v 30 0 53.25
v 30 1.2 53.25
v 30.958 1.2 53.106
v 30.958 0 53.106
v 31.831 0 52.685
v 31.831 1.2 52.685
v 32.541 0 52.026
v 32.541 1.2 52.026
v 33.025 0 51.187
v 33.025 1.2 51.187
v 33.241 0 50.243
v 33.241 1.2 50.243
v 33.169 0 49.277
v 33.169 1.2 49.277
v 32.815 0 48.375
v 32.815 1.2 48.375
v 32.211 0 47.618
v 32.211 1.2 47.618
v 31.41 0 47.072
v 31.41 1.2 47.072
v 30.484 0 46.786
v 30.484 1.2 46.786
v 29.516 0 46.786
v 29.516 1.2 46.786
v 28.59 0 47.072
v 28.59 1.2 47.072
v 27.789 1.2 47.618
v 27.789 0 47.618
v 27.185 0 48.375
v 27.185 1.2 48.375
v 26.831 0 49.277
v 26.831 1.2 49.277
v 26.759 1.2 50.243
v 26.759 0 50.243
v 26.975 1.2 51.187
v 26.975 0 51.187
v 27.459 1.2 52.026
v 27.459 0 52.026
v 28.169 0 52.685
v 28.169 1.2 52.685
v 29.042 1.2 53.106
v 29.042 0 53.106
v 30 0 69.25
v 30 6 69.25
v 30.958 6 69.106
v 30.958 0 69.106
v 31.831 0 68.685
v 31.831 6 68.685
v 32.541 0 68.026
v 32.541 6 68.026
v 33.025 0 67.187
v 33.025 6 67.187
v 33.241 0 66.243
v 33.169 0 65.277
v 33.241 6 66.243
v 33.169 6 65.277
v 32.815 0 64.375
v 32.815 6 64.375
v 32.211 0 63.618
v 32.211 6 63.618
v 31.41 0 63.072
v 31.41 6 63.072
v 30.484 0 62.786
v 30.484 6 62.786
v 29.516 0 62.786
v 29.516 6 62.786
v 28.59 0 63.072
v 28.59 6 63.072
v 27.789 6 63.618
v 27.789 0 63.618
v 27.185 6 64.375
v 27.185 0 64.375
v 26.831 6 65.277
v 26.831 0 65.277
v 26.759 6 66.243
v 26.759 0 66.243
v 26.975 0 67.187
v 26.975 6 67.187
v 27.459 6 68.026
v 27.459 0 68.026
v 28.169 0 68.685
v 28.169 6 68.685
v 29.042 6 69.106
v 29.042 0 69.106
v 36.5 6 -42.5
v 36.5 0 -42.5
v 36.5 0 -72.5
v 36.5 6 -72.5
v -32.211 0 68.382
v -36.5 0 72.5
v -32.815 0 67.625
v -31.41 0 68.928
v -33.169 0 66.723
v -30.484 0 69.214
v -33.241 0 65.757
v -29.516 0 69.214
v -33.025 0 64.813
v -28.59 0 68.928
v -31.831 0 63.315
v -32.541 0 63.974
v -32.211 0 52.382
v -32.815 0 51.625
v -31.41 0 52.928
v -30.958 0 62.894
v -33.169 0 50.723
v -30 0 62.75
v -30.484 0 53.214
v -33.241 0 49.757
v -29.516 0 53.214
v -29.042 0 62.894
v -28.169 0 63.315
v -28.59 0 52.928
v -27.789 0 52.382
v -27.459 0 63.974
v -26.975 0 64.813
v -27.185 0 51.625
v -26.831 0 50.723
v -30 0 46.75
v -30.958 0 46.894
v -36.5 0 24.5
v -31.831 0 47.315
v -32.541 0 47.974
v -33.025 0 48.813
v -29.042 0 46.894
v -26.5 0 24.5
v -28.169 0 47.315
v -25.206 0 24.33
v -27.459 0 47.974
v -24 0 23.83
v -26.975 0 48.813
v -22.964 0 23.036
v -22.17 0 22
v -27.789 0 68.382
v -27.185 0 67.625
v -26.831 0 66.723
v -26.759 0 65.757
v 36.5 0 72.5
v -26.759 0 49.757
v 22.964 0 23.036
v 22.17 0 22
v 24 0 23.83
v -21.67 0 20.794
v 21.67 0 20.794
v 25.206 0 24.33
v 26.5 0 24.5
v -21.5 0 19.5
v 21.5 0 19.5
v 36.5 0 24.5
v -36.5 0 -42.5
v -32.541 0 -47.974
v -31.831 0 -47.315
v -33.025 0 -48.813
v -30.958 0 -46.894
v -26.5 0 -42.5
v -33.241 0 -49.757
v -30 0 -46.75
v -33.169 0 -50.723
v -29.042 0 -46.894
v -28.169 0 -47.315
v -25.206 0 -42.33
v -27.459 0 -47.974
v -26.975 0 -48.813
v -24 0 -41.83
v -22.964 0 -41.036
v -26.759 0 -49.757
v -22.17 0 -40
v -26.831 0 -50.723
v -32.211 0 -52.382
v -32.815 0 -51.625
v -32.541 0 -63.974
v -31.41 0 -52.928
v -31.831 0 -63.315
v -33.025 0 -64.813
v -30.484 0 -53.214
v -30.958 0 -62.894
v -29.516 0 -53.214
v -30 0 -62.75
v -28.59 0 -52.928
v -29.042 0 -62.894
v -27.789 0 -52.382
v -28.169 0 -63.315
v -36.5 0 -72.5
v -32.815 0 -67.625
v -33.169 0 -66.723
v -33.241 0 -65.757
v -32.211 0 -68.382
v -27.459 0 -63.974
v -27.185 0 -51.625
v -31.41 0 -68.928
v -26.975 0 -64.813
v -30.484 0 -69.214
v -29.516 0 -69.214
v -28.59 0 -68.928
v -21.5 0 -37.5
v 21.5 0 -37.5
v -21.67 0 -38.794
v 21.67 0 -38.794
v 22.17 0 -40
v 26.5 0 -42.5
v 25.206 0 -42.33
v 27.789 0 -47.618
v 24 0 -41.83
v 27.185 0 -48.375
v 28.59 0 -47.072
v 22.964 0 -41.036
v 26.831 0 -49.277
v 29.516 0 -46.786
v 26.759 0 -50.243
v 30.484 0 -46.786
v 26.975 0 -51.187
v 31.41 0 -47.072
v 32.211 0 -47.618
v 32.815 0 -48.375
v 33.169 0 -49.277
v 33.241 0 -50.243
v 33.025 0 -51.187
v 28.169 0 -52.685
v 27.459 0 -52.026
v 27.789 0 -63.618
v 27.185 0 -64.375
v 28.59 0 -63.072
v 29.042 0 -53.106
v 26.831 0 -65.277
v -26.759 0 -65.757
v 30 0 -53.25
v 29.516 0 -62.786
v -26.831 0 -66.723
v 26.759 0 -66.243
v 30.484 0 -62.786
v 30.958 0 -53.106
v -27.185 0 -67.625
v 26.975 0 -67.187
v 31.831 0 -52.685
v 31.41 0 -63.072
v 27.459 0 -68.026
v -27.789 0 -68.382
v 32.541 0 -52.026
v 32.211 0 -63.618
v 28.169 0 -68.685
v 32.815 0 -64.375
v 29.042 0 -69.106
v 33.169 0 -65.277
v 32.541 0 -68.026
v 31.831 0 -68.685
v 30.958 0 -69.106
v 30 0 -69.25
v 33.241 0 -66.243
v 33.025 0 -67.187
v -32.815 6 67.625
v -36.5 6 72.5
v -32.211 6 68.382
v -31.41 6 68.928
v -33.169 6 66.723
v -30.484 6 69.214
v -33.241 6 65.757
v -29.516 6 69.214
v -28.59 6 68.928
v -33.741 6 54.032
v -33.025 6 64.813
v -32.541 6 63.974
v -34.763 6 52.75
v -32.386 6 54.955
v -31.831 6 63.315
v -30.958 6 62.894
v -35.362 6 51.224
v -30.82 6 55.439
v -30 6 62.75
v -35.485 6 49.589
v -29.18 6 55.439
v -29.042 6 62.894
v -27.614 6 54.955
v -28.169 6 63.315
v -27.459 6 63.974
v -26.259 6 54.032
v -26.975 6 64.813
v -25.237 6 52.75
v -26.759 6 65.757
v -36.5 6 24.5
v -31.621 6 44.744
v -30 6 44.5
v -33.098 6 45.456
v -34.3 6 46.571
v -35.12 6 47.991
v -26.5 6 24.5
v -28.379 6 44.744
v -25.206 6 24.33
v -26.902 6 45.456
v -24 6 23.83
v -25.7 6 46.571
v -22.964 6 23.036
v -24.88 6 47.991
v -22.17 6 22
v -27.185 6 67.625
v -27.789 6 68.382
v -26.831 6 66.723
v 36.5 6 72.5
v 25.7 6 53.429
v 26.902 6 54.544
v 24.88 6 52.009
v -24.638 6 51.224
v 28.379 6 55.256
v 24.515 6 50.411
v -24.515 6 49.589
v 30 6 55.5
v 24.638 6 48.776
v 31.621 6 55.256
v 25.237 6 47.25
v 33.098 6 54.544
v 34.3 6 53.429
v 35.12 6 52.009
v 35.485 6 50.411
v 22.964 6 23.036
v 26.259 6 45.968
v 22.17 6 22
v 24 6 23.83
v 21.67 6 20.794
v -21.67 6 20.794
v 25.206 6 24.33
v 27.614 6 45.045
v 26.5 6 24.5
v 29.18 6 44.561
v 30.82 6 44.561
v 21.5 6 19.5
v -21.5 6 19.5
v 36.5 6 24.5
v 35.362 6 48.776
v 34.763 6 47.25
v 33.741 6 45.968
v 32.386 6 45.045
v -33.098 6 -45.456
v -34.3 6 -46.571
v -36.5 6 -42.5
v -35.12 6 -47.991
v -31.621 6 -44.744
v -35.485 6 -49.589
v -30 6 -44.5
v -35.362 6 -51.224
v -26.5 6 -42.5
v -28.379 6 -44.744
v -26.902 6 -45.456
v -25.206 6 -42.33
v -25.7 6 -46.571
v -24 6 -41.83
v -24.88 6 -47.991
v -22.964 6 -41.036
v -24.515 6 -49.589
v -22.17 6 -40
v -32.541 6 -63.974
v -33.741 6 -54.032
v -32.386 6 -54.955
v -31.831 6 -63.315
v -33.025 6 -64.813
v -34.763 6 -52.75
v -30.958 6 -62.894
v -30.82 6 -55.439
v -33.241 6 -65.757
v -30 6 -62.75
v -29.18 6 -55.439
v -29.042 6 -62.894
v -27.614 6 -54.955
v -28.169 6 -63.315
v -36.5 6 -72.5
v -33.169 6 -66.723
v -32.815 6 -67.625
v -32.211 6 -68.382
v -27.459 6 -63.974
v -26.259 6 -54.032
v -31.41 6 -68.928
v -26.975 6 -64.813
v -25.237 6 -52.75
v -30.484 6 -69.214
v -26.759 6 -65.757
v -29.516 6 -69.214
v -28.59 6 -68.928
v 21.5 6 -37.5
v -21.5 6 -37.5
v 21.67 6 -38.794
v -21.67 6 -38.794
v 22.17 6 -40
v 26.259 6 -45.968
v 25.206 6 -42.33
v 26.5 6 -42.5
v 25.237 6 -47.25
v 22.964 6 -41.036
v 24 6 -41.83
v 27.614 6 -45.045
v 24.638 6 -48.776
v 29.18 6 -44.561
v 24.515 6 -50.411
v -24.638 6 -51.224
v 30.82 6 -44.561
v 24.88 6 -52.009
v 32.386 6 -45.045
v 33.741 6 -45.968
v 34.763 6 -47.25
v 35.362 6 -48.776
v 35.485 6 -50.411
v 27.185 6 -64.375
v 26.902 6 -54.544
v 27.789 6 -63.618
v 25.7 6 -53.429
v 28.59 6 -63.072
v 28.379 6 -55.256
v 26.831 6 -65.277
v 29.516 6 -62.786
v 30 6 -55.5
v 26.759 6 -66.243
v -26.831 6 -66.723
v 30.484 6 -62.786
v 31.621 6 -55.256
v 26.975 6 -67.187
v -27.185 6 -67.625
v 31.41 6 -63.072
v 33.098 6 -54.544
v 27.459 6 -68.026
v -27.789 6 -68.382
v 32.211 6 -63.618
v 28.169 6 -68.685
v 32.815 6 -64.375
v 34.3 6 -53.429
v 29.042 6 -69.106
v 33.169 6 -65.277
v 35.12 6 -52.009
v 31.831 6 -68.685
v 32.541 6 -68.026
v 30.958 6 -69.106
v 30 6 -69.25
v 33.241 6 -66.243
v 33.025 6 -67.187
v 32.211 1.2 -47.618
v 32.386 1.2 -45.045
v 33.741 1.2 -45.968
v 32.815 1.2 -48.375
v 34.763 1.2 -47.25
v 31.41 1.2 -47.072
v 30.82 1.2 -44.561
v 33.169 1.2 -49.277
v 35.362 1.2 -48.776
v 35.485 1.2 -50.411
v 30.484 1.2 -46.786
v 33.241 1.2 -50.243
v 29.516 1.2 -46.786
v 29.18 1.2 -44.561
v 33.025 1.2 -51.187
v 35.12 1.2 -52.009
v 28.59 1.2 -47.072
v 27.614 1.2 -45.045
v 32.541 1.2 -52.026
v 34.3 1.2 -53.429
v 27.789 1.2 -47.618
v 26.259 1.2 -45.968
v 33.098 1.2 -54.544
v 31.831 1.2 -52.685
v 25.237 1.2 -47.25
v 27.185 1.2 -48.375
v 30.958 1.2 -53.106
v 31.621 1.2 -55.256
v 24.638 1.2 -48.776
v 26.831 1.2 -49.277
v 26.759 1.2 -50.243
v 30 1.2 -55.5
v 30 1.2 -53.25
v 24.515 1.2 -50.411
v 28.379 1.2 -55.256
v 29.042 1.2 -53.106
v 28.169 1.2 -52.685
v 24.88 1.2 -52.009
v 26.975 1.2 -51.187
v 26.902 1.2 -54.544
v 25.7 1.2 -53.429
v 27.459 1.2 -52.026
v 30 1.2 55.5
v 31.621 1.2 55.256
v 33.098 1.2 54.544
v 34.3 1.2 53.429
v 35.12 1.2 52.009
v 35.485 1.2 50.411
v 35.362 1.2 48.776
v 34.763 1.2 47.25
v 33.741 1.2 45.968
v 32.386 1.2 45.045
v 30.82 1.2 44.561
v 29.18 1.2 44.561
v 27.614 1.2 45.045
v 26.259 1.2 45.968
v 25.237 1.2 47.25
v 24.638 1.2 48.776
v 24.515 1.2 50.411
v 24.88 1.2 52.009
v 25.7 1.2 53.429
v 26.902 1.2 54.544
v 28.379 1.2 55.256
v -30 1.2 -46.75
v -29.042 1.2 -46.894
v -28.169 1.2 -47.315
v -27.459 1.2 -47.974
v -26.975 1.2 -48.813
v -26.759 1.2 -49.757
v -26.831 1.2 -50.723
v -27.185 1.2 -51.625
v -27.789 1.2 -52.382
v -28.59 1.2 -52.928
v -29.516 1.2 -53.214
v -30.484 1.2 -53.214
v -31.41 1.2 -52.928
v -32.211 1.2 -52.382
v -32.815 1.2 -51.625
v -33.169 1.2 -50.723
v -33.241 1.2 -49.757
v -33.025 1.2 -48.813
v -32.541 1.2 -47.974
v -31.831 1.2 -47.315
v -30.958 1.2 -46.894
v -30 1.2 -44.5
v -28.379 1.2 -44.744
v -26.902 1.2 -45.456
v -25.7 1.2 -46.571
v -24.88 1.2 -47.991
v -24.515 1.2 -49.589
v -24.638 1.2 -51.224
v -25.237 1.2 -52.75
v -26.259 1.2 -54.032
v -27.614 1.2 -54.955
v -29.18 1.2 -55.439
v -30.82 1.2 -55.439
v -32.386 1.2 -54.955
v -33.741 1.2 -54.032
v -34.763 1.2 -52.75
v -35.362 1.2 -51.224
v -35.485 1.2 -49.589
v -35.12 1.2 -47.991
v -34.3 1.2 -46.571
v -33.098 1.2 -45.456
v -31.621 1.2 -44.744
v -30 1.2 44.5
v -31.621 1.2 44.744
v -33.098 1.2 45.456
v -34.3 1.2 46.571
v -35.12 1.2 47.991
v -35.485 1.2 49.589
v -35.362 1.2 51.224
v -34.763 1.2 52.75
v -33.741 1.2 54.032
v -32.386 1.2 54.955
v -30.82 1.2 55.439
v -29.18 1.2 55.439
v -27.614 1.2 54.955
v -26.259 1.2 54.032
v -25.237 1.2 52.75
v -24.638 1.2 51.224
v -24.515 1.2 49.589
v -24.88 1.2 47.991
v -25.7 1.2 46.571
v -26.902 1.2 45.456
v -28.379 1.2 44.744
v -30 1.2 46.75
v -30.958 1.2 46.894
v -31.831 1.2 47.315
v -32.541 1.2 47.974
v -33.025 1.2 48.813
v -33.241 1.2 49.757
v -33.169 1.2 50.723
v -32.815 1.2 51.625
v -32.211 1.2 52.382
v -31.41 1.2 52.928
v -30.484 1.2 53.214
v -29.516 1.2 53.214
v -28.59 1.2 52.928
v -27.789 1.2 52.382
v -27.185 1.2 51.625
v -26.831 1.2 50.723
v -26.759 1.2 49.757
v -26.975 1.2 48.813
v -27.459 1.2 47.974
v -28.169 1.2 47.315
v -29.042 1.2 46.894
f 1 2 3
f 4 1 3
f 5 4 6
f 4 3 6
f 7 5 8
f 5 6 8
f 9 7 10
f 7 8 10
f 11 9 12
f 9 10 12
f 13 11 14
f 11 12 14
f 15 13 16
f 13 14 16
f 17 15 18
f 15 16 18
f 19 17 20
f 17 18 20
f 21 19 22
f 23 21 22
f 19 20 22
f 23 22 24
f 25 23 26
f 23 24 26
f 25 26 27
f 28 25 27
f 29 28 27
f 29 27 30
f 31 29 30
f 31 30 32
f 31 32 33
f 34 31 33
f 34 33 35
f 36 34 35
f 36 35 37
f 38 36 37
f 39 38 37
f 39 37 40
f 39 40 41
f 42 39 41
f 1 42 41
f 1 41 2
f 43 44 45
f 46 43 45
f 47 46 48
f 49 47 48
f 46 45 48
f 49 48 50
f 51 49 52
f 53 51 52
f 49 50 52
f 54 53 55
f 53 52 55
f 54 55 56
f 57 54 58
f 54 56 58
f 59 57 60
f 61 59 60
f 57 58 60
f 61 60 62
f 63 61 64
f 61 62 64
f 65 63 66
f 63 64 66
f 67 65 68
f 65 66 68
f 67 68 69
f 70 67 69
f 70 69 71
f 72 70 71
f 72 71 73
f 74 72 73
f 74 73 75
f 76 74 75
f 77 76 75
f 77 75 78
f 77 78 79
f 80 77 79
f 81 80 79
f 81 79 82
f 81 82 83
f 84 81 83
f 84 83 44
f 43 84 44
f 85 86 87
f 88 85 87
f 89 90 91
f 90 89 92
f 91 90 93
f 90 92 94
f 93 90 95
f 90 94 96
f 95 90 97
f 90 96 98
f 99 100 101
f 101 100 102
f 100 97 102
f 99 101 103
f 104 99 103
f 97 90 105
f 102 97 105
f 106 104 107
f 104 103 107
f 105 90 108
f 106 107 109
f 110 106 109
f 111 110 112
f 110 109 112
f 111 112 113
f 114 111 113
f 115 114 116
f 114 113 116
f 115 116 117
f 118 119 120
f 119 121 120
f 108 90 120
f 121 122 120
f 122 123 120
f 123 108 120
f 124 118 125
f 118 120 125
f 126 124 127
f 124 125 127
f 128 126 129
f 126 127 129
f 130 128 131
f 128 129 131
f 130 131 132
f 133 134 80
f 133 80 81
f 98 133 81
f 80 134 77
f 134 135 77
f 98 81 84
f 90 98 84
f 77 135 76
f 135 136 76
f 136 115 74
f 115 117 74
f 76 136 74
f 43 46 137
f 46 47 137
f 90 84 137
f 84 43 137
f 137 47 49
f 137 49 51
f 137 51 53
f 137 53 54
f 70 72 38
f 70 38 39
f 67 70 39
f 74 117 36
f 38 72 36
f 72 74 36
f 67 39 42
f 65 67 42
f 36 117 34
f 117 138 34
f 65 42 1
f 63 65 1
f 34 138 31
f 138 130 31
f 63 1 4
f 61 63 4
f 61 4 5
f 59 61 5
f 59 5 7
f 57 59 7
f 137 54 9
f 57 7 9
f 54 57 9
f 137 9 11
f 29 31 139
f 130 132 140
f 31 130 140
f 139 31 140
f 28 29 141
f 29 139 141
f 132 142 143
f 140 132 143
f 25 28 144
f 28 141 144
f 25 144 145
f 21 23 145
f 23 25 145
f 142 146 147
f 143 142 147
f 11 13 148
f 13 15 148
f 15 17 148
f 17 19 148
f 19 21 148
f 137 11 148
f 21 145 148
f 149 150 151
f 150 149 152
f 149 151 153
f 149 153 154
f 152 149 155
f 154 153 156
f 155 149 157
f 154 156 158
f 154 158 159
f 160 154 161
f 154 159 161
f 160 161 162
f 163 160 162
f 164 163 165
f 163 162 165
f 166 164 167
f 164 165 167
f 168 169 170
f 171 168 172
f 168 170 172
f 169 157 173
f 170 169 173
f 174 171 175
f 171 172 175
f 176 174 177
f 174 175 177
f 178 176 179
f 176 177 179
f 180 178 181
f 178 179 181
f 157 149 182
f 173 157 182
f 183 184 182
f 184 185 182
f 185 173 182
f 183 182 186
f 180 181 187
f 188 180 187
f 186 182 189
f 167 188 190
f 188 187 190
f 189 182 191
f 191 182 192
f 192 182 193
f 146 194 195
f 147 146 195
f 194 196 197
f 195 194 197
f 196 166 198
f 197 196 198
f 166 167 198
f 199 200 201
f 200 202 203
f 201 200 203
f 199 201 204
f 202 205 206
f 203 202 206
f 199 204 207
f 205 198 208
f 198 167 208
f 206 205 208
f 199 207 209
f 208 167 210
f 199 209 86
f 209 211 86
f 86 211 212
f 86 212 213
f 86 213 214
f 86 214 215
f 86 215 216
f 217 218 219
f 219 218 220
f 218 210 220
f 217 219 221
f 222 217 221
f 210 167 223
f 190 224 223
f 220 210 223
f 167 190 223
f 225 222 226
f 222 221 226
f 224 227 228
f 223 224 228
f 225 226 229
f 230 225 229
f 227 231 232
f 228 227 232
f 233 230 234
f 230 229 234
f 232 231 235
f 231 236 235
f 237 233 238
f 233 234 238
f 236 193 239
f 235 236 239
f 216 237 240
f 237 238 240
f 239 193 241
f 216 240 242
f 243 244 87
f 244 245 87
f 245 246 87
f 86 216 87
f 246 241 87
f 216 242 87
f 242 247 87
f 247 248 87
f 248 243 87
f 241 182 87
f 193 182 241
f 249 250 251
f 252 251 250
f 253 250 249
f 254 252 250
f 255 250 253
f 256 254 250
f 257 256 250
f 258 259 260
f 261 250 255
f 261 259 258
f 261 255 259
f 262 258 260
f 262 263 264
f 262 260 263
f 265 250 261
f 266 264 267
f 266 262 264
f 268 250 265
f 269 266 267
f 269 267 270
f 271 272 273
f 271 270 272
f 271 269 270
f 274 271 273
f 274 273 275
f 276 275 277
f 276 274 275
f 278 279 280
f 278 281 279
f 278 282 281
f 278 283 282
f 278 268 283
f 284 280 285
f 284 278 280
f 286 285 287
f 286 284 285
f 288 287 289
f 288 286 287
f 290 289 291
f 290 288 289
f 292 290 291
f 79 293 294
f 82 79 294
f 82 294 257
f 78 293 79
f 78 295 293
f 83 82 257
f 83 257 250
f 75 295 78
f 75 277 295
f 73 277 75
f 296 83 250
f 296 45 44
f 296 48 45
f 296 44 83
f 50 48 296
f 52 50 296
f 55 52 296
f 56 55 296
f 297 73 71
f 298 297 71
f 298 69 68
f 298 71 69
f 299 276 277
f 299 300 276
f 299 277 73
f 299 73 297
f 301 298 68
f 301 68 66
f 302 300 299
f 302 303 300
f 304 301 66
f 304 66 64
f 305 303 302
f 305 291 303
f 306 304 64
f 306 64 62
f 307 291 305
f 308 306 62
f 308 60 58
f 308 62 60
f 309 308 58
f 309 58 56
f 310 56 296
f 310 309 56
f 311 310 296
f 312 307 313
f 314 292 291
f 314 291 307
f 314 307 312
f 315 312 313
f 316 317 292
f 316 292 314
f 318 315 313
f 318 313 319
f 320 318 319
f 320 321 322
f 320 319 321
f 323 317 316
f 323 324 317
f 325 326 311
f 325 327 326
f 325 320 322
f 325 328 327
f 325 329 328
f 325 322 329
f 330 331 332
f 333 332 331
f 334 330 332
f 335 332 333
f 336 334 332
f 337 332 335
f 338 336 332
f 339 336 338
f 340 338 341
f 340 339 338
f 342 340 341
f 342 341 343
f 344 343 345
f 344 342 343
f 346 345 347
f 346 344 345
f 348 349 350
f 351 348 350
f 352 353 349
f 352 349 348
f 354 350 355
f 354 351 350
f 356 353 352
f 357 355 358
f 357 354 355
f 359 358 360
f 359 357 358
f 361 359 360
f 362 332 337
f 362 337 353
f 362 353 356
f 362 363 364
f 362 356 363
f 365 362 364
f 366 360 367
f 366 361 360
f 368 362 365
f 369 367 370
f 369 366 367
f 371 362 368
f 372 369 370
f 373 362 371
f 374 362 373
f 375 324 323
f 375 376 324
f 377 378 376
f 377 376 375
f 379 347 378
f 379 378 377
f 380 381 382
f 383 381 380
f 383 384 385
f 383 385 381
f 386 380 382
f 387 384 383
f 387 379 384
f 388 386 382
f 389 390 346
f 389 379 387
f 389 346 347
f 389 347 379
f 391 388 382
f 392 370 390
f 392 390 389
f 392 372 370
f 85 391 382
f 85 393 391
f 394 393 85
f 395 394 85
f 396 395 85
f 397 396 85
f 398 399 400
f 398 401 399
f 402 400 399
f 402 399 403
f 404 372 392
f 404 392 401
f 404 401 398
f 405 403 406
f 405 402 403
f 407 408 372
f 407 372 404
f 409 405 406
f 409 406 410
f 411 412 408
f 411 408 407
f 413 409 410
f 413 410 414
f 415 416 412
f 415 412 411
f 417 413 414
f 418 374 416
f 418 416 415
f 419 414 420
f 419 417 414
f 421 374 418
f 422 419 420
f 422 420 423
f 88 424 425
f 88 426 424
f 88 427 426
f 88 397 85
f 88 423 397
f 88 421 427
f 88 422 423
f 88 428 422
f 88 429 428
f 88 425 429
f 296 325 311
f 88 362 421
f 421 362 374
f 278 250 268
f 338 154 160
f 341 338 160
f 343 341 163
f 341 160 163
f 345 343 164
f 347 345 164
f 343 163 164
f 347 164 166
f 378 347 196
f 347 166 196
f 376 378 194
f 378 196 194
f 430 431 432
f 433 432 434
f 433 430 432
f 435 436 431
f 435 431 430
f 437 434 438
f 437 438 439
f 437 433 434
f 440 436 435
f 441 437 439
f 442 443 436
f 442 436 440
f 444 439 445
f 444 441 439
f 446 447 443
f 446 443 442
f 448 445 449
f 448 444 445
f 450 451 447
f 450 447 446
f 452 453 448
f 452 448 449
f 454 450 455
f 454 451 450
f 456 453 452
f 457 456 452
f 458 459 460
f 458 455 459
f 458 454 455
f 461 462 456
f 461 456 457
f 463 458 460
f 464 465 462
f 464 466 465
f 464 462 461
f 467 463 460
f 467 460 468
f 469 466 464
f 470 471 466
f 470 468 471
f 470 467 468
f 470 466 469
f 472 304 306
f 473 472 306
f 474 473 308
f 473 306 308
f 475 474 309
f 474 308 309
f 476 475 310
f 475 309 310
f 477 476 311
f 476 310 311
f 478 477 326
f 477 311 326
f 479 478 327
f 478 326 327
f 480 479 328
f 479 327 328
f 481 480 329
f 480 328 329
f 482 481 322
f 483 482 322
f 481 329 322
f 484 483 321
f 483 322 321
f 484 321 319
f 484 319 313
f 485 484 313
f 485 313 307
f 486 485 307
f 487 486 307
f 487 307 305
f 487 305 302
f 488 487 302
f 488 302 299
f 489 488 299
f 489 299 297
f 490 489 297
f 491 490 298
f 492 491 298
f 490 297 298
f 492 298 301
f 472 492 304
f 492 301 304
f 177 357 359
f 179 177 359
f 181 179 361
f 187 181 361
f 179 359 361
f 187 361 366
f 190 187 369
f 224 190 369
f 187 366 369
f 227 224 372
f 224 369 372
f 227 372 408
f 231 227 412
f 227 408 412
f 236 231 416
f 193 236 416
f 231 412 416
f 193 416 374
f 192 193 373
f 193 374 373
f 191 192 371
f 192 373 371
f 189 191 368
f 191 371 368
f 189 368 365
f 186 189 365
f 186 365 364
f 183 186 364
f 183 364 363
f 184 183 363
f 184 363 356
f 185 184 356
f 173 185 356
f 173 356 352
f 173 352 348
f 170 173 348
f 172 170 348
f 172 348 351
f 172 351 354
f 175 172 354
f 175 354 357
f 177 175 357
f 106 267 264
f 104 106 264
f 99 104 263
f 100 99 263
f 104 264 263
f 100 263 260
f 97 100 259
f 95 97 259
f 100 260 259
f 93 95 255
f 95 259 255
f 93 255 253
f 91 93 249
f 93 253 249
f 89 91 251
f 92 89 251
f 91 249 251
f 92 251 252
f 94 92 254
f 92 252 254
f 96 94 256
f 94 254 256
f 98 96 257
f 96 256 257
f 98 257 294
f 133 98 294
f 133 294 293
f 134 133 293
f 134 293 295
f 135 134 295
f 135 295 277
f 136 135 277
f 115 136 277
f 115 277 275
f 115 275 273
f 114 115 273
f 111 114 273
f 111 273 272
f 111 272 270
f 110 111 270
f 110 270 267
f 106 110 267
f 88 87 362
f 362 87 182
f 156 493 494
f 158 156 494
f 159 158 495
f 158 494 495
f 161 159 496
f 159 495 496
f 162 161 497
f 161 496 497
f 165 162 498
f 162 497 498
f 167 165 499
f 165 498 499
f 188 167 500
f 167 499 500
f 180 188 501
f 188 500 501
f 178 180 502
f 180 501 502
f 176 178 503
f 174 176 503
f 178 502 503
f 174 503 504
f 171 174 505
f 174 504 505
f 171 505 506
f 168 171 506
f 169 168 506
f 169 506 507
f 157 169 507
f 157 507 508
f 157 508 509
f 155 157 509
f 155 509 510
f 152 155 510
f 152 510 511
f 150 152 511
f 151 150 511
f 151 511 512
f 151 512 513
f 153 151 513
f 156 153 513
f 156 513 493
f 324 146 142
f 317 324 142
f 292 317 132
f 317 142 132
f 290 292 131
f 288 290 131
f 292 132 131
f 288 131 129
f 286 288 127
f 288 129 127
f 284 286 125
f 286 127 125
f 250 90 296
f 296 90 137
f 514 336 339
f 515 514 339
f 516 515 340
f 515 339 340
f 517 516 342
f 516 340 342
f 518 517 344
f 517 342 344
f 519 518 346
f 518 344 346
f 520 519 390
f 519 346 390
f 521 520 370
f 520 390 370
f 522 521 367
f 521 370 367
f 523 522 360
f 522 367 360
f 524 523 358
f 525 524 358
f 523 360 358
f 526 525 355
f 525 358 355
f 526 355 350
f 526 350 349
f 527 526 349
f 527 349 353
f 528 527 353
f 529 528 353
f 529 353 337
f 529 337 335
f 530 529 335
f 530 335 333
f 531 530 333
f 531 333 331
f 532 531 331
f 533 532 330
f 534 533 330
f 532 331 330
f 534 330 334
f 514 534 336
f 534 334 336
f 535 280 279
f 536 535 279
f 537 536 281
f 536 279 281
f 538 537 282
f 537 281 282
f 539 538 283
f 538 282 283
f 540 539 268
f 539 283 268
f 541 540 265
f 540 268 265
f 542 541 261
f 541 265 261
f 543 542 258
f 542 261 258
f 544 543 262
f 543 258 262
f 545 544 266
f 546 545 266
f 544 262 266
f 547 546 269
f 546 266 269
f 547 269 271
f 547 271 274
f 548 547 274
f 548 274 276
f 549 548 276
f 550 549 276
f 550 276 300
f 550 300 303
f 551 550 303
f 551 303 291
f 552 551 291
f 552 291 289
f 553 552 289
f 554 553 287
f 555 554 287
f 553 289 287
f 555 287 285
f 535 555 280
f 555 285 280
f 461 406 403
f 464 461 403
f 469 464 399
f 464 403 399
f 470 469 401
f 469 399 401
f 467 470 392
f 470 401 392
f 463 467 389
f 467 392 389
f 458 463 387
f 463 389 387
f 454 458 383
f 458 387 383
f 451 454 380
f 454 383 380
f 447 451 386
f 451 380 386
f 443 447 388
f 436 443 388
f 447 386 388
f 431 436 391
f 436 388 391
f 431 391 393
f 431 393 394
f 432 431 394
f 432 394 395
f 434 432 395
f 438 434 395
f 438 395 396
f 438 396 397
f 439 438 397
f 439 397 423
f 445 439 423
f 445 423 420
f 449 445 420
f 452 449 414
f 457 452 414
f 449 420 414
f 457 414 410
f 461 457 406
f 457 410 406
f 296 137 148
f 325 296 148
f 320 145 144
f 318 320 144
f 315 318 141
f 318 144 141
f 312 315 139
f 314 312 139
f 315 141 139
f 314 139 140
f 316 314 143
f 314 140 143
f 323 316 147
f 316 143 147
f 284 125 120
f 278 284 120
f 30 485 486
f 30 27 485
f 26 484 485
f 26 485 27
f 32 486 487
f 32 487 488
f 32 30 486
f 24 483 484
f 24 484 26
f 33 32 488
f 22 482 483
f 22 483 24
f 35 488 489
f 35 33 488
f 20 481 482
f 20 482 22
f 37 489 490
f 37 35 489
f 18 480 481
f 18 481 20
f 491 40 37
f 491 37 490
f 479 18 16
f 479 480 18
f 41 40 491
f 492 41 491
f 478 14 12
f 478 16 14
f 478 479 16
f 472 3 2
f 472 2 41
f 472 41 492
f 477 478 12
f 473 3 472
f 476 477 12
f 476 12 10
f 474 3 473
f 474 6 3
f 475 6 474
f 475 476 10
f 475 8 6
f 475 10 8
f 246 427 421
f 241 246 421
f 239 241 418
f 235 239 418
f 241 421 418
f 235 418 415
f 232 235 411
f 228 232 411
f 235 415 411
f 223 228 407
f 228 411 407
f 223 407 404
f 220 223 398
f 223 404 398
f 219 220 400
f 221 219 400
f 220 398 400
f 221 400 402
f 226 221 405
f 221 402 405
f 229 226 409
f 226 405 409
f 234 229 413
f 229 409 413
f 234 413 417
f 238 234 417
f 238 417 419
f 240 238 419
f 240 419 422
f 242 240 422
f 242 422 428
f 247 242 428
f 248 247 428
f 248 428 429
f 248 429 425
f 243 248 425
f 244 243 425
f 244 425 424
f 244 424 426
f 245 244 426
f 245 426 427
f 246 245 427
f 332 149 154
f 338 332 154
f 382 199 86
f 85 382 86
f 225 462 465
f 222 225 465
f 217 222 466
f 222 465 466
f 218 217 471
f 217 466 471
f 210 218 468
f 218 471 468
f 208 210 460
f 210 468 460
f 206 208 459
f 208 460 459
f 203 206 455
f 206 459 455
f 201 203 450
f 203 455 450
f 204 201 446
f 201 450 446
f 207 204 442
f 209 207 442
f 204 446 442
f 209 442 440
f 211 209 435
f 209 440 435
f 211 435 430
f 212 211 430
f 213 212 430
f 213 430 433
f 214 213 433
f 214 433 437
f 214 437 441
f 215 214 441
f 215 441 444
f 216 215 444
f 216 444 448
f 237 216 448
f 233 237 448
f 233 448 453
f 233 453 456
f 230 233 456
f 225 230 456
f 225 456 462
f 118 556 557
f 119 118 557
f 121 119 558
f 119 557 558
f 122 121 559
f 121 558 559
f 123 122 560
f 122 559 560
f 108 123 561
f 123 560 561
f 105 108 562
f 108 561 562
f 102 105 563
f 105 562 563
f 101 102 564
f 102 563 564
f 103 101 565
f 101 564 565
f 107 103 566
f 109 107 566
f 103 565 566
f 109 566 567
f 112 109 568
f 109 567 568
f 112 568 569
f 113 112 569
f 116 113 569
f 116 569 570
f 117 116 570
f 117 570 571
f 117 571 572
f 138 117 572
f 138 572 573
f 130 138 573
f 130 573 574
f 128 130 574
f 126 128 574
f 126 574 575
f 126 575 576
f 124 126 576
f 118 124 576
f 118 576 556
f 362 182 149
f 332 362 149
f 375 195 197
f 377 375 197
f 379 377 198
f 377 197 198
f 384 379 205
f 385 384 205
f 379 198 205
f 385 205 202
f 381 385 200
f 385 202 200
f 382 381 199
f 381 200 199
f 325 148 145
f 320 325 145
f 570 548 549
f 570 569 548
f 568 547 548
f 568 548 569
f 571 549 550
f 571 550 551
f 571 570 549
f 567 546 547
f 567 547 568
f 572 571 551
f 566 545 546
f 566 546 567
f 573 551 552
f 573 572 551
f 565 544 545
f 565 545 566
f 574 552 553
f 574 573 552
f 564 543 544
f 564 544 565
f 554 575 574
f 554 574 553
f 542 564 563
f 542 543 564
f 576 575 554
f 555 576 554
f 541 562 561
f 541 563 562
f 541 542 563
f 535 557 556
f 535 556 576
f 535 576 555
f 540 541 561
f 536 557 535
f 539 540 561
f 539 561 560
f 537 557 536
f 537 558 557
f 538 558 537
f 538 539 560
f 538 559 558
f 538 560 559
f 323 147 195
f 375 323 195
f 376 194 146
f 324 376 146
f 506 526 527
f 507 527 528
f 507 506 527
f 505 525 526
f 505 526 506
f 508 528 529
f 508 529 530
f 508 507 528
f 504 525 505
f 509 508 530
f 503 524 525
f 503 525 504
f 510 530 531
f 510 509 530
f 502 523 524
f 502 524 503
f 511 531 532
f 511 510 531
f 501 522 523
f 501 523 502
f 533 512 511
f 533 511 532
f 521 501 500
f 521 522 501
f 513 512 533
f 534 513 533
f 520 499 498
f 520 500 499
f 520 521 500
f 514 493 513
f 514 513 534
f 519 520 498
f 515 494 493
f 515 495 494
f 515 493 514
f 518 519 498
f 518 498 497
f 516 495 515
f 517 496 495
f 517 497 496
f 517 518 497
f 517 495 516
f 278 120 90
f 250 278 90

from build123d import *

# Parameters (mm, degrees)
BOSS_EXTRUDE1_DEPTH = 6
SKETCH2_R           = 3.25
CUT_EXTRUDE1_DEPTH  = 82.391031447
SKETCH3_R           = 5.5
CUT_EXTRUDE2_DEPTH  = 4.8


with BuildPart() as part:
    # Sketch1 → Boss-Extrude1 (new body)
    with BuildSketch(Plane(origin=(0, 0, 0), x_dir=(1, 0, 0), z_dir=(0, 1, 0))):
        with BuildLine():
            Line((-36.5, -72.5), (36.5, -72.5))
            Line((36.5, -72.5), (36.5, -24.5))
            Line((36.5, -24.5), (26.5, -24.5))
            ThreePointArc((26.5, -24.5), (22.964466094, -23.035533906), (21.5, -19.5))
            Line((21.5, -19.5), (21.5, 37.5))
            ThreePointArc((21.5, 37.5), (22.964466094, 41.035533906), (26.5, 42.5))
            Line((26.5, 42.5), (36.5, 42.5))
            Line((36.5, 42.5), (36.5, 72.5))
            Line((36.5, 72.5), (-36.5, 72.5))
            Line((-36.5, 72.5), (-36.5, 42.5))
            Line((-36.5, 42.5), (-26.5, 42.5))
            ThreePointArc((-26.5, 42.5), (-22.964466094, 41.035533906), (-21.5, 37.5))
            Line((-21.5, 37.5), (-21.5, -19.5))
            ThreePointArc((-21.5, -19.5), (-22.964466094, -23.035533906), (-26.5, -24.5))
            Line((-26.5, -24.5), (-36.5, -24.5))
            Line((-36.5, -24.5), (-36.5, -72.5))
        make_face()
    extrude(amount=BOSS_EXTRUDE1_DEPTH)

    # Sketch2 → Cut-Extrude1 (cut, through all)
    with BuildSketch(Plane(origin=(0, 6, 0), x_dir=(1, 0, 0), z_dir=(0, 1, 0))):
        with Locations(Location((-30, 66, 0), (0, 0, 270))):
            Circle(SKETCH2_R)
        with Locations(Location((-30, 50, 0), (0, 0, 270))):
            Circle(SKETCH2_R)
        with Locations(Location((30, 50, 0), (0, 0, 90))):
            Circle(SKETCH2_R)
        with Locations(Location((30, 66, 0), (0, 0, 90))):
            Circle(SKETCH2_R)
        with Locations(Location((30, -50, 0), (0, 0, 270))):
            Circle(SKETCH2_R)
        with Locations(Location((30, -66, 0), (0, 0, 270))):
            Circle(SKETCH2_R)
        with Locations(Location((-30, -50, 0), (0, 0, 90))):
            Circle(SKETCH2_R)
        with Locations(Location((-30, -66, 0), (0, 0, 90))):
            Circle(SKETCH2_R)
    extrude(amount=-CUT_EXTRUDE1_DEPTH, mode=Mode.SUBTRACT)

    # Sketch3 → Cut-Extrude2 (cut)
    with BuildSketch(Plane(origin=(0, 6, 0), x_dir=(1, 0, 0), z_dir=(0, 1, 0))):
        with Locations(Location((-30, 50, 0), (0, 0, 270))):
            Circle(SKETCH3_R)
        with Locations(Location((30, 50, 0), (0, 0, 90))):
            Circle(SKETCH3_R)
        with Locations(Location((30, -50, 0), (0, 0, 270))):
            Circle(SKETCH3_R)
        with Locations(Location((-30, -50, 0), (0, 0, 90))):
            Circle(SKETCH3_R)
    extrude(amount=-CUT_EXTRUDE2_DEPTH, mode=Mode.SUBTRACT)


solid = part.part
